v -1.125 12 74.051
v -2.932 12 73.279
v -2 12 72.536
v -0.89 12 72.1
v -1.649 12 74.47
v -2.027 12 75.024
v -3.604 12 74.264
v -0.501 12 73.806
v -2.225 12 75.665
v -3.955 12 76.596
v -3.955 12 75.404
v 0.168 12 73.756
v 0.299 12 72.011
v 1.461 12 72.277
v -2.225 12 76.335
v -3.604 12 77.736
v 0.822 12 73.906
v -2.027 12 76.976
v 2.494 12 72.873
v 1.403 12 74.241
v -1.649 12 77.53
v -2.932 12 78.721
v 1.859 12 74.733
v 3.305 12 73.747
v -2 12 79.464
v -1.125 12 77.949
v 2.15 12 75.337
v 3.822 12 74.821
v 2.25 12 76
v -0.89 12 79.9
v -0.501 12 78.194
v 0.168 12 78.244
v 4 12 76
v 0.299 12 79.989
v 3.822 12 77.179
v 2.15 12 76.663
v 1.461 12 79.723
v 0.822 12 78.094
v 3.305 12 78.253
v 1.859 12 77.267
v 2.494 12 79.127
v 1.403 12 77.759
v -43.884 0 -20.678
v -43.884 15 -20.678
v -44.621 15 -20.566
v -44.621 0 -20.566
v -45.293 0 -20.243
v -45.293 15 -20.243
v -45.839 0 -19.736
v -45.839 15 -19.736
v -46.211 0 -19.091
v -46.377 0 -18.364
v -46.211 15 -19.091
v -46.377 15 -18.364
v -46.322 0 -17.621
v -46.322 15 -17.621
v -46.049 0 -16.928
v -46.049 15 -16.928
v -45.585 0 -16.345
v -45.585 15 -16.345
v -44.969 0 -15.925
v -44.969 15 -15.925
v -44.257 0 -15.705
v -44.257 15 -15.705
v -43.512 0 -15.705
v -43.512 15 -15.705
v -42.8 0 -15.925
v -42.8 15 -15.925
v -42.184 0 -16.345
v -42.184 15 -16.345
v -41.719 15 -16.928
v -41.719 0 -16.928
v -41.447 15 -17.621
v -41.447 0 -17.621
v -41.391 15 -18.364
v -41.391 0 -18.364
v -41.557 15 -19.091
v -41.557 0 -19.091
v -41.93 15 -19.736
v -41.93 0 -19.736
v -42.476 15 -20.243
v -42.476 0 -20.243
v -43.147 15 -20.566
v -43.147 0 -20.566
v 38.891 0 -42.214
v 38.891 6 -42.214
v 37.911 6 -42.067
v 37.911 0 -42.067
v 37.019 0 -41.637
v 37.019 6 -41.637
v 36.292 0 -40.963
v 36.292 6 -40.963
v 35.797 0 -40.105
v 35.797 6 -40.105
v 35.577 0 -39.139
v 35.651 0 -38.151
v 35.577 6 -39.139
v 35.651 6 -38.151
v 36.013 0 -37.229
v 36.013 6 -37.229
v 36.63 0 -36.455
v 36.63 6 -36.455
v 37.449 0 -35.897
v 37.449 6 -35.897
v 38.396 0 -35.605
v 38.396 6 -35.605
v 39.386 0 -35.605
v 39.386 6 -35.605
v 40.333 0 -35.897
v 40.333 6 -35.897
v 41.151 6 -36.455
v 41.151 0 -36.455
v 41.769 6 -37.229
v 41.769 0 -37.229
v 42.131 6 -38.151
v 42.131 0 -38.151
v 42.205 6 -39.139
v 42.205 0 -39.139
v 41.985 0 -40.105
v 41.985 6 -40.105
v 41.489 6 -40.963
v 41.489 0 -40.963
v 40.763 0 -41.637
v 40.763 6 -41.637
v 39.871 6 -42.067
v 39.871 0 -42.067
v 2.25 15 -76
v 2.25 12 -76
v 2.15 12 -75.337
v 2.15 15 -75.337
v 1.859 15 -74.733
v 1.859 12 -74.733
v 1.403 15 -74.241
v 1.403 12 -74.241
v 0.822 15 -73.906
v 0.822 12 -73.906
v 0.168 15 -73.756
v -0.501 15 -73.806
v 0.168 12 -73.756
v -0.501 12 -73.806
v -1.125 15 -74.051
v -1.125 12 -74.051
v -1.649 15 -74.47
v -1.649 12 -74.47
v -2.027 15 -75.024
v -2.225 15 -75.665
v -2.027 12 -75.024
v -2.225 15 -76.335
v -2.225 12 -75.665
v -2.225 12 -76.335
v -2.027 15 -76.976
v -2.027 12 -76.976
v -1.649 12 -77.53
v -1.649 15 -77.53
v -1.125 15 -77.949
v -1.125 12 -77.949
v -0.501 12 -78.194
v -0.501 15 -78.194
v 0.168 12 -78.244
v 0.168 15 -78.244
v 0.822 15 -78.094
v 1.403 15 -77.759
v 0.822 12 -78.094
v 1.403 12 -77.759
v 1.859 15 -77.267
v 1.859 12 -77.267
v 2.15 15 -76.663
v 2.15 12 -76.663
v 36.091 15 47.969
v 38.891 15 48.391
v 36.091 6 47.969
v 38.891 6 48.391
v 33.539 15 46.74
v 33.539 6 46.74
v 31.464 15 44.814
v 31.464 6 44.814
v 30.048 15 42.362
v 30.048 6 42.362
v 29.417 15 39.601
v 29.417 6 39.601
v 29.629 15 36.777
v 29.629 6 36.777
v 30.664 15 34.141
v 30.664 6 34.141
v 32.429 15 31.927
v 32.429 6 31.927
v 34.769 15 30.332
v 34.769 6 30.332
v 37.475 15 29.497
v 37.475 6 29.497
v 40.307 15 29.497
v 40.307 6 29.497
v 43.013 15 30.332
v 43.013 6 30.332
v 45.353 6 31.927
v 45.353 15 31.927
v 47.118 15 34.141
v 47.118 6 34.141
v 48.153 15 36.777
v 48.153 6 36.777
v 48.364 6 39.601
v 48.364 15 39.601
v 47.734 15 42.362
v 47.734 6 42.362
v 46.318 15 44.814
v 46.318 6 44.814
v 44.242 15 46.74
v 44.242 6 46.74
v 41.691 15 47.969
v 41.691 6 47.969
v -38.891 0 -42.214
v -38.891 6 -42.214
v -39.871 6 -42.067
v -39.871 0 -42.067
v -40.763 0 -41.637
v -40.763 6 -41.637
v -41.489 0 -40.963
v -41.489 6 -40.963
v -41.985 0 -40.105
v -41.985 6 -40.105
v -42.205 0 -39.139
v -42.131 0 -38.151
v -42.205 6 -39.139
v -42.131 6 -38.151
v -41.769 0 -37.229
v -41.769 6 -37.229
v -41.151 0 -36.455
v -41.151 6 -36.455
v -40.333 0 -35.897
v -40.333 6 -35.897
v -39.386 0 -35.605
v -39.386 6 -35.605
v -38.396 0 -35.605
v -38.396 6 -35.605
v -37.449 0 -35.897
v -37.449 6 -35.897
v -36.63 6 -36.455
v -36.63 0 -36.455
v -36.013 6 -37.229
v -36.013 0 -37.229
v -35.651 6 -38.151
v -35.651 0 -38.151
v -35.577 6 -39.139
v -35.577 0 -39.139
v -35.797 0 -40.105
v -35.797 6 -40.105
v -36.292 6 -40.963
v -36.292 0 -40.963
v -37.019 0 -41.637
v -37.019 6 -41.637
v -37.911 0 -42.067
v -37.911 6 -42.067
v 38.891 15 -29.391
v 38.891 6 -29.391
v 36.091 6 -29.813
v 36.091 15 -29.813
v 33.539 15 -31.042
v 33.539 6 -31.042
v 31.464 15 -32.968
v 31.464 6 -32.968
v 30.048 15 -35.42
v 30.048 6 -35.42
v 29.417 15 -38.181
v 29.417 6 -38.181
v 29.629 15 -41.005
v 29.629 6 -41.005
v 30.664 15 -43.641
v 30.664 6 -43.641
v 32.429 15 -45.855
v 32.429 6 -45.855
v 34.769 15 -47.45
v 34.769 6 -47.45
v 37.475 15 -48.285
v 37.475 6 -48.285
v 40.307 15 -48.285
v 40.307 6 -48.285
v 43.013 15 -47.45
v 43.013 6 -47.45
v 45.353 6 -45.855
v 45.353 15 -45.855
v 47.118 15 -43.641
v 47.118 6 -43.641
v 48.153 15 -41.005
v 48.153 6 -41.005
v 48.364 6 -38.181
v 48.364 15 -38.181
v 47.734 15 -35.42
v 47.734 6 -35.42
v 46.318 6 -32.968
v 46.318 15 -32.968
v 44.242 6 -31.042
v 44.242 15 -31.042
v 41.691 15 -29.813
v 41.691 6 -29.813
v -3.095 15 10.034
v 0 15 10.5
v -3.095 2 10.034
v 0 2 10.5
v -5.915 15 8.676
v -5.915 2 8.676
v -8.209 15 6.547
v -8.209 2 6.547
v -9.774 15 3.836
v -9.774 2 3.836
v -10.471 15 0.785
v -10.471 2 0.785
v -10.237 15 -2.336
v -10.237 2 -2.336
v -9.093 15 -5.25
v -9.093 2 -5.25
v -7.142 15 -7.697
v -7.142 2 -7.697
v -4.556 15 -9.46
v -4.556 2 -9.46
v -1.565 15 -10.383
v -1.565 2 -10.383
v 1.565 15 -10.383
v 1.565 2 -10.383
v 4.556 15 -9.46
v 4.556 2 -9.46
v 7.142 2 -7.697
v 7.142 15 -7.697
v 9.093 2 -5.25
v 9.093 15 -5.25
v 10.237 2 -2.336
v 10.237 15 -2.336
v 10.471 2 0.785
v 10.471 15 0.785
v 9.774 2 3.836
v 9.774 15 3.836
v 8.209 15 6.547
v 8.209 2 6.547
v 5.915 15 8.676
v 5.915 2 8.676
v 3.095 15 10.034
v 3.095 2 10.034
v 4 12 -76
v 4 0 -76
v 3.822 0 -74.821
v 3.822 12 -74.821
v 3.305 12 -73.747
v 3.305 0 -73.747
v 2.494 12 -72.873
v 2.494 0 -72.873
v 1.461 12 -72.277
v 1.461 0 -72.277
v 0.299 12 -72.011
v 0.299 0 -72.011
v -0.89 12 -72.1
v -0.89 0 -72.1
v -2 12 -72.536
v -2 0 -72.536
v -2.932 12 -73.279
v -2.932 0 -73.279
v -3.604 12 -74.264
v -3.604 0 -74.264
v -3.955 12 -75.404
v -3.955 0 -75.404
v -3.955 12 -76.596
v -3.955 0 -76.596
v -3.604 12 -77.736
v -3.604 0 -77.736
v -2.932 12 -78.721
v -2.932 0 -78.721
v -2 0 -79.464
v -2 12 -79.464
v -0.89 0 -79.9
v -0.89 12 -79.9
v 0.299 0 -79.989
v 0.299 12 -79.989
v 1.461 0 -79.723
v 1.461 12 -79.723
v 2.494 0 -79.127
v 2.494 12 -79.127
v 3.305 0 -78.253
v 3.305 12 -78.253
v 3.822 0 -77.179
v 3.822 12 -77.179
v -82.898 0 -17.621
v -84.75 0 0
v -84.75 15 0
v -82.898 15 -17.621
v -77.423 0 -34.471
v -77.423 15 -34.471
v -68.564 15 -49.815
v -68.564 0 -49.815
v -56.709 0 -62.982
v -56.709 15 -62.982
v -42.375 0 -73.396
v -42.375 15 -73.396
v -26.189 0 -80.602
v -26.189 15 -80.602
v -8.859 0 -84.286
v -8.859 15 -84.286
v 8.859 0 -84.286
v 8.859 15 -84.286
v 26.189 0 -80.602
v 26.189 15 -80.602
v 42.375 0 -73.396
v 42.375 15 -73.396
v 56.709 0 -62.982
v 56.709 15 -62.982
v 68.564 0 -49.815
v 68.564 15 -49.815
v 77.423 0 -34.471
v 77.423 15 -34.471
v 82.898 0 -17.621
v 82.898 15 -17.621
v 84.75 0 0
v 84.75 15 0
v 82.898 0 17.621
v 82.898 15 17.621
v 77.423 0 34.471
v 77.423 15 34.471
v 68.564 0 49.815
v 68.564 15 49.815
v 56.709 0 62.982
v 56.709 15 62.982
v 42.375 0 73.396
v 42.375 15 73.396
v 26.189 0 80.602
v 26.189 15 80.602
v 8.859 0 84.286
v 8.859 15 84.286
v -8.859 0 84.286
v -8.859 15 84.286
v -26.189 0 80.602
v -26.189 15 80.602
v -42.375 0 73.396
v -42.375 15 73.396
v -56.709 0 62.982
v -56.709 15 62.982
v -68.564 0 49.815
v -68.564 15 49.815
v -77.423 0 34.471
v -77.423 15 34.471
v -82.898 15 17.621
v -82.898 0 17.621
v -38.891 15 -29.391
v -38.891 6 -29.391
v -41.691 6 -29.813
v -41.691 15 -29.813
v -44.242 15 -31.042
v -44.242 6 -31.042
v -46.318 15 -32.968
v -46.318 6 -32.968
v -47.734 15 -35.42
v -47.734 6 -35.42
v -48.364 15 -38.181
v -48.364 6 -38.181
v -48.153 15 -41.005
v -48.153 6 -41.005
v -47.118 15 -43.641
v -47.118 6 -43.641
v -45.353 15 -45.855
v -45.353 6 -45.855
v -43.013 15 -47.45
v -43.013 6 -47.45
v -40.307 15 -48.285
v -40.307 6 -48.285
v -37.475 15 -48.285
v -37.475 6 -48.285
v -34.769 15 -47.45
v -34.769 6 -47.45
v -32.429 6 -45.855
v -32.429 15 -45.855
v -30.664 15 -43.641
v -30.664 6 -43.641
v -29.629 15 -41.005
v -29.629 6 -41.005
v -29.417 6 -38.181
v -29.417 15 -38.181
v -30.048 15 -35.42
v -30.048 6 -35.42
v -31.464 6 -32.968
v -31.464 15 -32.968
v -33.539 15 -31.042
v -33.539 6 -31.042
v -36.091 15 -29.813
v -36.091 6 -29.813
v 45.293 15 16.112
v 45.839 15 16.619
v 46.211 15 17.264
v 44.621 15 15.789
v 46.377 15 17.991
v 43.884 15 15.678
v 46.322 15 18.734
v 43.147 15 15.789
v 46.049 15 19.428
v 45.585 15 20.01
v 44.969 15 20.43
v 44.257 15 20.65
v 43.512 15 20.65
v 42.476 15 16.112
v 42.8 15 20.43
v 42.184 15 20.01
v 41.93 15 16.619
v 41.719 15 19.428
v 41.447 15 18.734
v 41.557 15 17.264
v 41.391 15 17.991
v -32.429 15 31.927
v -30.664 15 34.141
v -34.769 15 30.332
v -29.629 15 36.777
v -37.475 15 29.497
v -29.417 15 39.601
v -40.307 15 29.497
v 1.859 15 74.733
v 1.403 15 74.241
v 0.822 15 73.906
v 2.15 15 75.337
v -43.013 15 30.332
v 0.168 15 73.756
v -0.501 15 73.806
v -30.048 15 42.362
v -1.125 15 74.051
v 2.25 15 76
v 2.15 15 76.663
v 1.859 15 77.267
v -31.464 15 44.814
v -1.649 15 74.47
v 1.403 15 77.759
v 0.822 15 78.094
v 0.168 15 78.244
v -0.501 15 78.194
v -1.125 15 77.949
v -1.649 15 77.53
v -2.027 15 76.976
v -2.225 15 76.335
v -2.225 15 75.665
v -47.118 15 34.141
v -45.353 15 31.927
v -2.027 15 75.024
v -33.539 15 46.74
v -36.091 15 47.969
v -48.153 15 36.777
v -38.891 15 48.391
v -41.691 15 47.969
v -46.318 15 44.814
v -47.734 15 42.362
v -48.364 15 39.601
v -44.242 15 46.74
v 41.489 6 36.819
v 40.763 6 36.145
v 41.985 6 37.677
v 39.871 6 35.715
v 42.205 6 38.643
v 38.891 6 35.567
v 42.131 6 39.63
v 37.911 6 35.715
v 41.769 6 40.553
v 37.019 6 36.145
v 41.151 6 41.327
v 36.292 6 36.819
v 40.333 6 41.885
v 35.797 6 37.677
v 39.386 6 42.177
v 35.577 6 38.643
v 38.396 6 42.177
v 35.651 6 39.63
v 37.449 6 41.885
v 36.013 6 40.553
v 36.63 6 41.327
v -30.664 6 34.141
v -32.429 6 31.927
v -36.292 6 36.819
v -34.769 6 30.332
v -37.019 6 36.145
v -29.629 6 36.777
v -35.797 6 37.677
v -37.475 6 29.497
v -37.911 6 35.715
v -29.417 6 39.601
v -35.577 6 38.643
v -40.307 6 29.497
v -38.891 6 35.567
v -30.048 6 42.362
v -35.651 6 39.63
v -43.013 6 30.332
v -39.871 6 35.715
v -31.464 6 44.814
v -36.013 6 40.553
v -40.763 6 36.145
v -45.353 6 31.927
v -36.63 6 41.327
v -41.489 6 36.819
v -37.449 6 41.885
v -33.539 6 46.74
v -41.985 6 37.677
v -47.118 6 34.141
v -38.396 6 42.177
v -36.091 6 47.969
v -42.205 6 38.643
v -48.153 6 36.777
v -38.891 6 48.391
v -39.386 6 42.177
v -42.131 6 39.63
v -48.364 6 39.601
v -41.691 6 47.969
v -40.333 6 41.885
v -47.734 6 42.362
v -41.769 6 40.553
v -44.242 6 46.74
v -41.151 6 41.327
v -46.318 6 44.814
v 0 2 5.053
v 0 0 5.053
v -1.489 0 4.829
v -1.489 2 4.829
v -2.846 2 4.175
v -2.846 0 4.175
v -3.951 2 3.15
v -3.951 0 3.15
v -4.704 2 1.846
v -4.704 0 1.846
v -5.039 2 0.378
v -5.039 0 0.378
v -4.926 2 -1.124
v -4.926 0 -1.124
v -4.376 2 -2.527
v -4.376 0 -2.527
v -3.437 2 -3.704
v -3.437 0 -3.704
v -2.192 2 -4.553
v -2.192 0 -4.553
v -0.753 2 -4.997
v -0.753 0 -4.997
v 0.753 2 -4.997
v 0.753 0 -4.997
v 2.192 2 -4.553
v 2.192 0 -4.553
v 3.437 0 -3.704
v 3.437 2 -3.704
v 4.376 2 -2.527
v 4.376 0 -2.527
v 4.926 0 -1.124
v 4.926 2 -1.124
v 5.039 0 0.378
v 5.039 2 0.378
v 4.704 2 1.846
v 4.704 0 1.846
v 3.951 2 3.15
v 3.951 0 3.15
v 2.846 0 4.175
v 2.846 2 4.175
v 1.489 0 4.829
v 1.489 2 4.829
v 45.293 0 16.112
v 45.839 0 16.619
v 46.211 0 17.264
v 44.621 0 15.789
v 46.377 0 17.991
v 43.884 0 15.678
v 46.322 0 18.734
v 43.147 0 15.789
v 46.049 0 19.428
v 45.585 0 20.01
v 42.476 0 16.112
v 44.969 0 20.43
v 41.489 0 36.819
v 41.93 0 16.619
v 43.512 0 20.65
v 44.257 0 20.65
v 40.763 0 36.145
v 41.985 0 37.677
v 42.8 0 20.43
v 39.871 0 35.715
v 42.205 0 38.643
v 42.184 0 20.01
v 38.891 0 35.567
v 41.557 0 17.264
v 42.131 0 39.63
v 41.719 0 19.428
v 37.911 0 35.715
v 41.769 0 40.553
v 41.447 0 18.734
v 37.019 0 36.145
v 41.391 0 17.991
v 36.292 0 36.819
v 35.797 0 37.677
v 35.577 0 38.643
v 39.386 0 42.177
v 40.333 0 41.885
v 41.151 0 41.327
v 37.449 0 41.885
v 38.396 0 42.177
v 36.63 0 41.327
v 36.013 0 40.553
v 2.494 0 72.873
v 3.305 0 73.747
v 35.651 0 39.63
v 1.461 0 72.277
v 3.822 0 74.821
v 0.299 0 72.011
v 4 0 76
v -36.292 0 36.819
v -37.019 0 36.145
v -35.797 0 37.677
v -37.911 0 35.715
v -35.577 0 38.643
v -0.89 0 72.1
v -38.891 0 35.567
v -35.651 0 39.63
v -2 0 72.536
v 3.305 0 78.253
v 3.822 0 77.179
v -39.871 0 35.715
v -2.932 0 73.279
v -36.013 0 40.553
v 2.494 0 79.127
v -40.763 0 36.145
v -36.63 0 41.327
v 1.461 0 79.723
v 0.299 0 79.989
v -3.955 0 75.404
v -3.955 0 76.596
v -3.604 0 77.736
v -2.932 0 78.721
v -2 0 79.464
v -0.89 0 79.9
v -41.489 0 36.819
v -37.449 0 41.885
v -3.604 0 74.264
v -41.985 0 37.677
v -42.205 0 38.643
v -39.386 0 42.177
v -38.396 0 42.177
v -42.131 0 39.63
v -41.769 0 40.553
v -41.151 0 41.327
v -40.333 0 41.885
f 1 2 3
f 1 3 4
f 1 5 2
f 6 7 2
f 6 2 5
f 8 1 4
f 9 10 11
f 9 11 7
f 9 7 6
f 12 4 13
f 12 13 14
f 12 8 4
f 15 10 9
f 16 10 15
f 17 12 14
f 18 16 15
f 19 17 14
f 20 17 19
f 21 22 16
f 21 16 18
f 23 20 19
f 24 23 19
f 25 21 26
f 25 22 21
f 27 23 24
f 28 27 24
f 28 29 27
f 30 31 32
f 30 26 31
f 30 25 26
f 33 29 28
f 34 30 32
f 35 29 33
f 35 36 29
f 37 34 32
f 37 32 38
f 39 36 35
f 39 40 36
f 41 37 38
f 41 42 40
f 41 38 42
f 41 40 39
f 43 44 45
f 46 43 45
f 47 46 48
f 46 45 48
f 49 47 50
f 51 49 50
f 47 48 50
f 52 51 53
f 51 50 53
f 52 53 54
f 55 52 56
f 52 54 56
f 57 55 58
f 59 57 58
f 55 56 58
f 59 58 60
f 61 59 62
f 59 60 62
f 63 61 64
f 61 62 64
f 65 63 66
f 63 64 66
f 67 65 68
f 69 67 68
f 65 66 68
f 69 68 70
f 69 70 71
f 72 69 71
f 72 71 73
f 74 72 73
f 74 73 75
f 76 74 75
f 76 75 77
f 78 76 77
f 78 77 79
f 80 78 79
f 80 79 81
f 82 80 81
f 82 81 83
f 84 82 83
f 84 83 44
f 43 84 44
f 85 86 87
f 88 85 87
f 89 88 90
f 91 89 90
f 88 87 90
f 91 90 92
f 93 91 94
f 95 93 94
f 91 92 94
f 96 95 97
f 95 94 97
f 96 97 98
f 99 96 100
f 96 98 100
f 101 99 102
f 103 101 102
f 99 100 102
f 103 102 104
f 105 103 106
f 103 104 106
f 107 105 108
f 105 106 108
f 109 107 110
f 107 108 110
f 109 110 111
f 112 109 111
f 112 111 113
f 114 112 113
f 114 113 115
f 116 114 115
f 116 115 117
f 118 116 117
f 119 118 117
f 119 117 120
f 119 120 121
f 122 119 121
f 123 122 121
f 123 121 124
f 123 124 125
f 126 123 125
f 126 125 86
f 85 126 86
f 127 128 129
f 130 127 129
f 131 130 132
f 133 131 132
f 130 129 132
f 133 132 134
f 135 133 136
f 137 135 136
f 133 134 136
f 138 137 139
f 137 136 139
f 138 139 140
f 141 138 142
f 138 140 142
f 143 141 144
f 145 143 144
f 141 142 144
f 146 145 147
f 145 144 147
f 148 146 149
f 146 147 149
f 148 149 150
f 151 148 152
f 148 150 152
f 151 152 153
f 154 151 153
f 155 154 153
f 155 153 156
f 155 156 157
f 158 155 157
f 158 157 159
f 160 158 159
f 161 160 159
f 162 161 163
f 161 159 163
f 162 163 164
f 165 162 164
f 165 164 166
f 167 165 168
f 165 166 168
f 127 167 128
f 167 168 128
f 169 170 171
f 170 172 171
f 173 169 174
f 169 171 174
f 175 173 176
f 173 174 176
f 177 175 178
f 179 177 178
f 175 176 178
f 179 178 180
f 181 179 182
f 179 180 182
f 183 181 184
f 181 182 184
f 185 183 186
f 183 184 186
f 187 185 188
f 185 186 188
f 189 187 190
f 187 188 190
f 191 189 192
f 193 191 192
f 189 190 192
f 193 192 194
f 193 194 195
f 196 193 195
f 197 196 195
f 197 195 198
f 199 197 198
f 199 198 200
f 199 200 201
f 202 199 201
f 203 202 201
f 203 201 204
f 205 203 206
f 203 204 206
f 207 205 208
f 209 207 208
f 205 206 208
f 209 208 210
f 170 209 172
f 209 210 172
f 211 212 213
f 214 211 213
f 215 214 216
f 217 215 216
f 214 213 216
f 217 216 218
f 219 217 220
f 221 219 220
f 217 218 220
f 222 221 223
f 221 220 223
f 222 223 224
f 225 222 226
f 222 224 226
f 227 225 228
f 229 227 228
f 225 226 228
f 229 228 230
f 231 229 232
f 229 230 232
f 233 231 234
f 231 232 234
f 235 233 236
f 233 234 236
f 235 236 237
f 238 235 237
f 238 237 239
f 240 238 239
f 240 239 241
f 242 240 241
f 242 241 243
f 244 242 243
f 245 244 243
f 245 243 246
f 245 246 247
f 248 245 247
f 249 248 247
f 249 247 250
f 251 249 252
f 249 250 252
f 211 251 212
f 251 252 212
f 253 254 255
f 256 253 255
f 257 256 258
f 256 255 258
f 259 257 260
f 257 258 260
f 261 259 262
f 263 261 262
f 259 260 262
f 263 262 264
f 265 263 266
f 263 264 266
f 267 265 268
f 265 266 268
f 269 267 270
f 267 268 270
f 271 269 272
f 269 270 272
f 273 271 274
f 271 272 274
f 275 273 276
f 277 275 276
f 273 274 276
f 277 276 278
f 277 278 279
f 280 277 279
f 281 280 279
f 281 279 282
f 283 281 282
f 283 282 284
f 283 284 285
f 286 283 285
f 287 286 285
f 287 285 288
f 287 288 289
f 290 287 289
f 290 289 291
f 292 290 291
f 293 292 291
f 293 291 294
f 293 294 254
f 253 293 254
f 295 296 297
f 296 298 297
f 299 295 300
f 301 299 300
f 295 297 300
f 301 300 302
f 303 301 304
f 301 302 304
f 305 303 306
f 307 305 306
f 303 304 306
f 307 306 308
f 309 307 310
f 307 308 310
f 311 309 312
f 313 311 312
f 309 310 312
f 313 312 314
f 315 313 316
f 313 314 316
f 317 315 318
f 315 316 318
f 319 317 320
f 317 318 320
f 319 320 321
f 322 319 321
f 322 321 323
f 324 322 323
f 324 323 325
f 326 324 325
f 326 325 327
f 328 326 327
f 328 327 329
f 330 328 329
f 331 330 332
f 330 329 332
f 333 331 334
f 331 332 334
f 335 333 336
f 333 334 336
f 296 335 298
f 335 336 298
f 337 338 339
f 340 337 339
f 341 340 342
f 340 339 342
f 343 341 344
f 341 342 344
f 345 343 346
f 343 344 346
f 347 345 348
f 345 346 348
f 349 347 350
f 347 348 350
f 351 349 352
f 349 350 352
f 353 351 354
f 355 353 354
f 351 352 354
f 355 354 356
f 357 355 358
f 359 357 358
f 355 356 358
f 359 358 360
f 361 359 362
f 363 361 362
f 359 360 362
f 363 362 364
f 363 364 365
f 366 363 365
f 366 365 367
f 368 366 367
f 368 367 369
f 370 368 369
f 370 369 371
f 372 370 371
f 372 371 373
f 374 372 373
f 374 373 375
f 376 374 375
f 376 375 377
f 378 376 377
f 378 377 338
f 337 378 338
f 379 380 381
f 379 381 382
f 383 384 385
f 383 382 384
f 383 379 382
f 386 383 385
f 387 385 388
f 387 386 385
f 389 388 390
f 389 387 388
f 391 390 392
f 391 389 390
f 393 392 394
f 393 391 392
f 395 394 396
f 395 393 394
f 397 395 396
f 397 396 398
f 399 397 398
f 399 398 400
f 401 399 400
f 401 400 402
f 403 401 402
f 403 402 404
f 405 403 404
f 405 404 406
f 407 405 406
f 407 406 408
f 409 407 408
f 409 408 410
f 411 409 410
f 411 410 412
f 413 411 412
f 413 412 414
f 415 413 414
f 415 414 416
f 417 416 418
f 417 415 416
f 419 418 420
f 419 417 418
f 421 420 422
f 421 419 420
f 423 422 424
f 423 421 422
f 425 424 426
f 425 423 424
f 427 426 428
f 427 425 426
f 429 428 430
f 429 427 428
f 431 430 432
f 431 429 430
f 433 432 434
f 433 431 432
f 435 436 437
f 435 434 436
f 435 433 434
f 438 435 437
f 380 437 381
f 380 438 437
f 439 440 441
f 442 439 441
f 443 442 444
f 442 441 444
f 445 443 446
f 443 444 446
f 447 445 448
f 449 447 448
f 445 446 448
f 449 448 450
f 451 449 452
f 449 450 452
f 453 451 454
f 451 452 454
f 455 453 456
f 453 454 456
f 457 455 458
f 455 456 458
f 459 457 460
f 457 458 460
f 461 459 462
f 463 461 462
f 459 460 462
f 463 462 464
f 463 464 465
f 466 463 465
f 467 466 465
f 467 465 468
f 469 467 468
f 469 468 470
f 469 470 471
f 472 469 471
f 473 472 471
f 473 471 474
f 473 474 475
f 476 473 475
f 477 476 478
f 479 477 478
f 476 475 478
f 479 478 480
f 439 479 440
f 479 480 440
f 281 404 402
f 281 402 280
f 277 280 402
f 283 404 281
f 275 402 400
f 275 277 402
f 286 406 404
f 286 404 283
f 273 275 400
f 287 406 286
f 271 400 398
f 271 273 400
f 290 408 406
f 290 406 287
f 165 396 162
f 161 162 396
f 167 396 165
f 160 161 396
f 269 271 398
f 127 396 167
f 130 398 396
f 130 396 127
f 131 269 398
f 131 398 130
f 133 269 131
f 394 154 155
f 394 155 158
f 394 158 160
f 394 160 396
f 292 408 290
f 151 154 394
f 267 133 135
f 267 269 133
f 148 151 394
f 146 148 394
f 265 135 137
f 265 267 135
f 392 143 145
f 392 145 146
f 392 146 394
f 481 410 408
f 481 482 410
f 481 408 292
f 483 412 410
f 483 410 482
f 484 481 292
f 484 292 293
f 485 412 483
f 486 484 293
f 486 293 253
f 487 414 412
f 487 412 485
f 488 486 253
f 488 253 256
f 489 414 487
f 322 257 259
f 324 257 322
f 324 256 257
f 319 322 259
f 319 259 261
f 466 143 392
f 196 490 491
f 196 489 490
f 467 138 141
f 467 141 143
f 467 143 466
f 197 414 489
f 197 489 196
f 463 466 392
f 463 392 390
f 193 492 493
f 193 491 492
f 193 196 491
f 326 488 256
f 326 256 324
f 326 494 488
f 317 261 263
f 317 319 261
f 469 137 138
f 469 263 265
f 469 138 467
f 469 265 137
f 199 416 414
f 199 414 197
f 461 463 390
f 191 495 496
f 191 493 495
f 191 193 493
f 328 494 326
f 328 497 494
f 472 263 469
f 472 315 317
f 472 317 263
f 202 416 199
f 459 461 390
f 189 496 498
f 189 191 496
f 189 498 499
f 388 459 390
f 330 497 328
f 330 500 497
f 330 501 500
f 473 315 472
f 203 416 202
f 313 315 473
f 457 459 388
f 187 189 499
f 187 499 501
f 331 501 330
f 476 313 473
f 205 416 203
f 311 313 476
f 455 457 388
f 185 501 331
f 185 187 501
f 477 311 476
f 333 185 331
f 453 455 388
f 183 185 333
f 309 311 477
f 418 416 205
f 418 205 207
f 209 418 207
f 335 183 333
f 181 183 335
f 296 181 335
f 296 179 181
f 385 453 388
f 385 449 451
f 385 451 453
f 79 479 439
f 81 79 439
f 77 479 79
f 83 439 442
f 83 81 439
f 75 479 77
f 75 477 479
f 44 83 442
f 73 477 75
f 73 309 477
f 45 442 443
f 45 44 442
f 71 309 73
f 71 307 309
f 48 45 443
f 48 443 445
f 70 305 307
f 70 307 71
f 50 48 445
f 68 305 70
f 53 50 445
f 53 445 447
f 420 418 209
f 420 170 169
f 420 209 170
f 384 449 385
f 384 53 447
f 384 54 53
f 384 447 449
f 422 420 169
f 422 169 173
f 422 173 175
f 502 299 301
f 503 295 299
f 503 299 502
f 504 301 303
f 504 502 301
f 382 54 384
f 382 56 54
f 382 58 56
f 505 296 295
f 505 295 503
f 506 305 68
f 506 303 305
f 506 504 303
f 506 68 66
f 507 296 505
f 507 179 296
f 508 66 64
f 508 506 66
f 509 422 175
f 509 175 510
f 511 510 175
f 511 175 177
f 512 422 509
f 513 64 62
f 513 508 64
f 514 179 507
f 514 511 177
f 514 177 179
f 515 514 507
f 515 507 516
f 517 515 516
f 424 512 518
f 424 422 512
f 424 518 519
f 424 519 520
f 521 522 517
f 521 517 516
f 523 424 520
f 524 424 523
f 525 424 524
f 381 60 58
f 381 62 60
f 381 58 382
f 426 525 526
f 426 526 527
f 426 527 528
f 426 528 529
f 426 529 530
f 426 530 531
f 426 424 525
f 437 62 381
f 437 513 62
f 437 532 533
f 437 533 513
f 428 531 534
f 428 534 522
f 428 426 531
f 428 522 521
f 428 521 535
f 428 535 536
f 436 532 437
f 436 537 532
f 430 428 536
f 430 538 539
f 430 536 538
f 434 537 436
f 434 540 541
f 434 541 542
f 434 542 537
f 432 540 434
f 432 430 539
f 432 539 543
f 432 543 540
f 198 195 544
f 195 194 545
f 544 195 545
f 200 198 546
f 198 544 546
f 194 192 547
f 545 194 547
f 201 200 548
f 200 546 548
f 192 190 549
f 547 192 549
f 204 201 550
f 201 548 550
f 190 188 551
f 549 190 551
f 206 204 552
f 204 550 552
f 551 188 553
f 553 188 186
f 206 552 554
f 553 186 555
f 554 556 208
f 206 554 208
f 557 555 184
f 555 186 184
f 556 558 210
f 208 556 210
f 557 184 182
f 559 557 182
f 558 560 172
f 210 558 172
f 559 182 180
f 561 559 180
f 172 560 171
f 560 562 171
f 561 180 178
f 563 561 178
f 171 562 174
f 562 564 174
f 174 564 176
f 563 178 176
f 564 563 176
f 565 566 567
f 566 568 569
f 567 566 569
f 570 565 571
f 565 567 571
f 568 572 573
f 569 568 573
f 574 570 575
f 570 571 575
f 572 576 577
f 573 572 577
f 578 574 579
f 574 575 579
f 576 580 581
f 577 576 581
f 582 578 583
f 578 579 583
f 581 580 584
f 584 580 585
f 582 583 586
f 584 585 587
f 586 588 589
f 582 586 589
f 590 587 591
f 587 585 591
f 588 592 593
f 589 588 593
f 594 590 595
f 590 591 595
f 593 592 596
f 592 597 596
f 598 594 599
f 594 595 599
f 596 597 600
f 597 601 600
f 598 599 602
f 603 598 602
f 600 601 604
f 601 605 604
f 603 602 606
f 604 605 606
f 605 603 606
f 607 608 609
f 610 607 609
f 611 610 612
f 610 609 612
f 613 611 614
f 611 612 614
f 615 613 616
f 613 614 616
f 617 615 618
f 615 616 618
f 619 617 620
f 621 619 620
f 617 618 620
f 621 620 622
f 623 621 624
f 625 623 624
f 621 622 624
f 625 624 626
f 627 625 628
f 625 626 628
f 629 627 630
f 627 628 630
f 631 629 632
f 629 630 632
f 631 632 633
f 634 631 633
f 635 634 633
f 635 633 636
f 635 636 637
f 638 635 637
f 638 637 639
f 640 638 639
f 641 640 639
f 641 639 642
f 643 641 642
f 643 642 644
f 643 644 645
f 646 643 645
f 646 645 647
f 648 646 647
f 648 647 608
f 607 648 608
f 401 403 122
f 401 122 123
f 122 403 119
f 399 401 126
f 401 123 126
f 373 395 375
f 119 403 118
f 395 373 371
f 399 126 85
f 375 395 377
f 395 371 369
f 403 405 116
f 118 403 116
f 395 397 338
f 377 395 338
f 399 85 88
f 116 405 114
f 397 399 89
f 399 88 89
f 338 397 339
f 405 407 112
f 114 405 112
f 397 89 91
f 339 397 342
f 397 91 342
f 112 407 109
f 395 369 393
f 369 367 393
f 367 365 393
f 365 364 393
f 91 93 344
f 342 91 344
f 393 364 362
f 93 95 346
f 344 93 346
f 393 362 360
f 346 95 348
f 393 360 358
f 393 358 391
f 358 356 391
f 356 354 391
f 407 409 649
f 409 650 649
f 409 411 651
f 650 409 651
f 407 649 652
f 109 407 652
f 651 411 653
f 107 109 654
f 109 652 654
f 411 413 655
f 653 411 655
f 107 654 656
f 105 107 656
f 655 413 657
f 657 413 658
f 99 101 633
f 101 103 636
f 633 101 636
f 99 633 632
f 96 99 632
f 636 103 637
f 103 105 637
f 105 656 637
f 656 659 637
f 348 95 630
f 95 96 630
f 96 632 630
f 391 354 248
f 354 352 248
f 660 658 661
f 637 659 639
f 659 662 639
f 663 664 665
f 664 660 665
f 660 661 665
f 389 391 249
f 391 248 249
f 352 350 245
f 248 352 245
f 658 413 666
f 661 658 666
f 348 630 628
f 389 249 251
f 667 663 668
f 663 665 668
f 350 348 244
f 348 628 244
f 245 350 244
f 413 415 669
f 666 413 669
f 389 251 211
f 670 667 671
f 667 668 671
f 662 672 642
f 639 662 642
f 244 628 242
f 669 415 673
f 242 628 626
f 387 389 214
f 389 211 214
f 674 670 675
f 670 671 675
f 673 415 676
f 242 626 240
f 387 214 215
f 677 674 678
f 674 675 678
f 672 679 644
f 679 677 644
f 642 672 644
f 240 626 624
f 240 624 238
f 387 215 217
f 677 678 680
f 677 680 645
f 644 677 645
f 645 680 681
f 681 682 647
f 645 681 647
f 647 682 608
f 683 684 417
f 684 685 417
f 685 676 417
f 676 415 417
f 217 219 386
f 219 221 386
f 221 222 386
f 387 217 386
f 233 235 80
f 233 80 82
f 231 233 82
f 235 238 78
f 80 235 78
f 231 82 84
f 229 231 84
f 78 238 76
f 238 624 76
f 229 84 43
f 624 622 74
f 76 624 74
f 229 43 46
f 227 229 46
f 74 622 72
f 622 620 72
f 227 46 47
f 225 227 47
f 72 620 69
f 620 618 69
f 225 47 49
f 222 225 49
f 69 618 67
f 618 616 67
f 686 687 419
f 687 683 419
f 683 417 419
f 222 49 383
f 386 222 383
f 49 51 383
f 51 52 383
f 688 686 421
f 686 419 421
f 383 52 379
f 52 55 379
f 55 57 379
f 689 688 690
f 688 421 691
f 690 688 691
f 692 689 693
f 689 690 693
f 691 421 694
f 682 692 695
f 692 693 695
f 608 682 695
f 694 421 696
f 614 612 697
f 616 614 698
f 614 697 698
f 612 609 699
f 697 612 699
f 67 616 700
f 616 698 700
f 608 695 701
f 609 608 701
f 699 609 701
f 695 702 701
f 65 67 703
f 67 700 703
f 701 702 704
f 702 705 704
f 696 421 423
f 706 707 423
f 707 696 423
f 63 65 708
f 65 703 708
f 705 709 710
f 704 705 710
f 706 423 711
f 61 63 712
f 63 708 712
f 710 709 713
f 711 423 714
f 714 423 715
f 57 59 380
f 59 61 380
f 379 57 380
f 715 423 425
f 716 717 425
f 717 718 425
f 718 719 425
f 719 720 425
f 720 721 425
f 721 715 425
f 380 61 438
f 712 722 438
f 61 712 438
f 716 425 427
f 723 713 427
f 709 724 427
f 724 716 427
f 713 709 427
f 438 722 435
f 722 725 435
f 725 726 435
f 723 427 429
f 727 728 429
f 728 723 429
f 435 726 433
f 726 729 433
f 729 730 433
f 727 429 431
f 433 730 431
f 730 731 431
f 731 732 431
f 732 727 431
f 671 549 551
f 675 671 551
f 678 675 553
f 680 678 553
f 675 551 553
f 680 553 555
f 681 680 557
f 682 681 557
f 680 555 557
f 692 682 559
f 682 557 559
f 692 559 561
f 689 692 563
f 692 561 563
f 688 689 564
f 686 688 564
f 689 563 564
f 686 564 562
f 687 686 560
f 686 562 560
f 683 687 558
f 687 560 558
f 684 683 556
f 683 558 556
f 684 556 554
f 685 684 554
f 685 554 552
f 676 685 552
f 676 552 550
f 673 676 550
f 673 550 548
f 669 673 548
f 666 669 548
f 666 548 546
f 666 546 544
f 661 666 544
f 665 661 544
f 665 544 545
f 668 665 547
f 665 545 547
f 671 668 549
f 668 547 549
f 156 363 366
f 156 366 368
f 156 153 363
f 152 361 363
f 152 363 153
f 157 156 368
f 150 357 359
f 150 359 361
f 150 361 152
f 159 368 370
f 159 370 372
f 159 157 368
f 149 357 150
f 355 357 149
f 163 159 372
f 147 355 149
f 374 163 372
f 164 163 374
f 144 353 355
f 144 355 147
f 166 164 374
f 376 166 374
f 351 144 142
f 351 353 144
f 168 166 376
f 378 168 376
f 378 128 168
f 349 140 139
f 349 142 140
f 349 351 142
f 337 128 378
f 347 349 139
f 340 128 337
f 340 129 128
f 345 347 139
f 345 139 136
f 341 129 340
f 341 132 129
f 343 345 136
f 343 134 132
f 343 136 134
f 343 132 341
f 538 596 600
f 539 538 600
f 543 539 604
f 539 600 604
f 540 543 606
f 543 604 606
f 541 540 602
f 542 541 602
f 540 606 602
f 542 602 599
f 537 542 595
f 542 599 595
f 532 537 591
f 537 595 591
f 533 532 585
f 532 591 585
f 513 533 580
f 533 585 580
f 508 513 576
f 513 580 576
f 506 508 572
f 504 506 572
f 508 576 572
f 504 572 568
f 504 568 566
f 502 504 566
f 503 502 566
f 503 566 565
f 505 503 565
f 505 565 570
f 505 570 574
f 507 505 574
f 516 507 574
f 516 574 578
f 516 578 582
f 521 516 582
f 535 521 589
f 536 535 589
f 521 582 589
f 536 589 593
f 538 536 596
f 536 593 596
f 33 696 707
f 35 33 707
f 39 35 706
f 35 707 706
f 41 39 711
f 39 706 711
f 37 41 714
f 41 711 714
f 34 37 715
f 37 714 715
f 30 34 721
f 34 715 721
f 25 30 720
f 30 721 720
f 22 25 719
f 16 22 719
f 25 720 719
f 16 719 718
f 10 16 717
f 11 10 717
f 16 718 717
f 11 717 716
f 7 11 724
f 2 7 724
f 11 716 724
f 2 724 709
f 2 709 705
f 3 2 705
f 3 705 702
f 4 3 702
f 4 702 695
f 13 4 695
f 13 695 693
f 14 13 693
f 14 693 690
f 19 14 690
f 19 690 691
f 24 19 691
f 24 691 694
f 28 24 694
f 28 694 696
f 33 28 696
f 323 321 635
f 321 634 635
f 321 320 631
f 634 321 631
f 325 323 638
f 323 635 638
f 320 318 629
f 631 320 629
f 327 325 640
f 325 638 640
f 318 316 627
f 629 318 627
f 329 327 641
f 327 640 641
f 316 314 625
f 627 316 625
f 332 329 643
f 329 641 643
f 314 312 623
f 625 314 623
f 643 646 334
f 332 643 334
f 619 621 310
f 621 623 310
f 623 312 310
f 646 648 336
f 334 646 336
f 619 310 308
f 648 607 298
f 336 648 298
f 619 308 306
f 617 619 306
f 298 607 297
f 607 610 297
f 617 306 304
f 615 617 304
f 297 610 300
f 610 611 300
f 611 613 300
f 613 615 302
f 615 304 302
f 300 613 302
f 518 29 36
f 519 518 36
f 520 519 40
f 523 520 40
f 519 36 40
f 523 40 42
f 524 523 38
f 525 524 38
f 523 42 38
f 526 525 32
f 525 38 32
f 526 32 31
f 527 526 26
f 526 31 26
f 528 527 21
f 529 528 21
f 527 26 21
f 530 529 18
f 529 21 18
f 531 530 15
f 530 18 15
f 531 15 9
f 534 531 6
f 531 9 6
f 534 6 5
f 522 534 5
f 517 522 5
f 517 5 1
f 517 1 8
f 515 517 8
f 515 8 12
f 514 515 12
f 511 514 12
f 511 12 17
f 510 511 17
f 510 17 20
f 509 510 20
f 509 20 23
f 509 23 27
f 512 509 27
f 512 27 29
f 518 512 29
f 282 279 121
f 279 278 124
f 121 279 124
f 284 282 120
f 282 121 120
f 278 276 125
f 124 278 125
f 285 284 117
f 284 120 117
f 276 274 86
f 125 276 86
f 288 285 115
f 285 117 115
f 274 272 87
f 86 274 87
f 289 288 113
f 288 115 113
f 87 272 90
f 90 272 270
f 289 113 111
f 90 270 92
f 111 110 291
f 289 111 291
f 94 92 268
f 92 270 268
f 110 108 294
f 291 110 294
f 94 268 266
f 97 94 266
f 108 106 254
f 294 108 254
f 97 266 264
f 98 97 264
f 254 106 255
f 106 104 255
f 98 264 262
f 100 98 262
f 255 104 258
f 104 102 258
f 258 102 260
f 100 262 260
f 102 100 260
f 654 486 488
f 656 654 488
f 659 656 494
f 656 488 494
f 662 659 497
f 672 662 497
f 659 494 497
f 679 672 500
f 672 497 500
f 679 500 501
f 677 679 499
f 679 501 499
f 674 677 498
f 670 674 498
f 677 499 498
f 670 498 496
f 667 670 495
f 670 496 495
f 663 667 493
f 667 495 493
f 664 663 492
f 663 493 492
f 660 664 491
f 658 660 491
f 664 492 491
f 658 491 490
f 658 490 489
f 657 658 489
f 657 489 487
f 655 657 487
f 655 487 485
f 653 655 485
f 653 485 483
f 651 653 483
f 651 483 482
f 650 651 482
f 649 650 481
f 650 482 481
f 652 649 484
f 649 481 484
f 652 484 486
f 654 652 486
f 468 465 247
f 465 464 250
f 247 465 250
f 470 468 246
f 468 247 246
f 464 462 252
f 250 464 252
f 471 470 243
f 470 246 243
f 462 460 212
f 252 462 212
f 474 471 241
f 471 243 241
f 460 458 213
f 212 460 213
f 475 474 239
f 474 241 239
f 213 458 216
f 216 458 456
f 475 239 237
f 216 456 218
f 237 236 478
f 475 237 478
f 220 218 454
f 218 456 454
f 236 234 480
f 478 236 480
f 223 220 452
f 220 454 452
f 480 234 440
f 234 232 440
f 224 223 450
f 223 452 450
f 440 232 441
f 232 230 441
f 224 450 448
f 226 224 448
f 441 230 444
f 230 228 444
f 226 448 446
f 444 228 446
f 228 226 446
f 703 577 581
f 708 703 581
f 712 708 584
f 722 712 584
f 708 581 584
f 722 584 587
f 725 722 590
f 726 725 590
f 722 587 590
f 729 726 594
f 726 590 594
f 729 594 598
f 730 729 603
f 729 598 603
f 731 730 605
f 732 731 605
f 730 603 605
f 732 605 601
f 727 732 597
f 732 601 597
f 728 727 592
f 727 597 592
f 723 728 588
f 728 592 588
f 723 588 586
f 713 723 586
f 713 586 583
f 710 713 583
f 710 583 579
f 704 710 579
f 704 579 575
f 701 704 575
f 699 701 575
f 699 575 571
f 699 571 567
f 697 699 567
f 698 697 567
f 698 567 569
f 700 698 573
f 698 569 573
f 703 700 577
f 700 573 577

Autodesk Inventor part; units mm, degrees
ref_plane "YZ Plane" through (0, 0, 0) normal (1, 0, 0) x (0, 1, 0)
ref_plane "XZ Plane" through (0, 0, 0) normal (0, 1, 0) x (-1, 0, 0)
ref_plane "XY Plane" through (0, 0, 0) normal (0, 0, 1) x (1, 0, 0)
sketch "Sketch1" plane through (0, 0, 0) normal (0, 1, 0) x (-1, 0, 0)
  circle A0 centre (0, 0) radius 84.75
  dimension "d0" = 169.5
extrude "Extrusion1" add sketch "Sketch1" along normal blind 15
sketch "Sketch2" plane through (0, 0, 0) normal (0, -1, 0) x (1, 0, 0)
  circle A0 centre (0, 0) radius 76
  circle A1 centre (0, 76) radius 4
  circle A2 centre (0, -76) radius 4
  circle A3 centre (0, 76) radius 2.25
  circle A4 centre (0, -76) radius 2.25
  dimension "d3" = 152
  dimension "d4" = 8
  dimension "d5" = 8
  dimension "d6" = 4.5
  dimension "d7" = 4.5
extrude "Extrusion2" cut sketch "Sketch2" against normal through all contours A3 A0 | A0 A3 | A4 A0 | A0 A4
extrude "Extrusion3" cut sketch "Sketch2" against normal blind 12 contours A1 A0 A3 | A0 A3 A1 | A2 A0 A4 | A0 A4 A2 | A3 A0 | A0 A3 | A4 A0 | A0 A4
sketch "Sketch3" plane through (0, 0, 0) normal (0, -1, 0) x (1, 0, 0)
  circle A0 centre (0, 0) radius 84.75
  circle A1 centre (0, 0) radius 20
  circle A2 centre (0, -20) radius 4
  circle A3 centre (20, 0) radius 4
  circle A4 centre (0, 20) radius 4
  circle A5 centre (-20, 0) radius 4
  line L0 (55, 55) -> (-55, 55)
  line L1 (-55, 55) -> (-55, -55)
  line L2 (-55, -55) -> (55, -55)
  line L3 (55, -55) -> (55, 55)
  line L4 (55, 55) -> (-55, -55) construction
  line L5 (-55, 55) -> (55, -55) construction
  circle A6 centre (0, 0) radius 55
  circle A7 centre (-38.8909, -38.8909) radius 4
  circle A8 centre (38.8909, -38.8909) radius 4
  circle A9 centre (38.8909, 38.8909) radius 4
  circle A10 centre (-38.8909, 38.8909) radius 4
  dimension "d12" = 40
  dimension "d13" = 8
  dimension "d16" = 360
  dimension "d21" = 110
  dimension "d22" = 110
  dimension "d23" = 110
  dimension "d24" = 8
  dimension "d25" = 8
  dimension "d26" = 8
  dimension "d27" = 8
hole "Hole1" at (38.8909, 0, -38.8909) at (38.8909, 0, 38.8909) at (-38.8909, 0, 38.8909) at (-38.8909, 0, -38.8909) direction (0, 1, 0) diameter 6.647 depth 20 tip angle 118 thread size "M8x1.25" class "6H" standard "ANSI Metric M Profile"
sketch "Sketch4" plane through (0, 0, 0) normal (0, -1, 0) x (1, 0, 0)
  circle A0 centre (0, 0) radius 47.5
  circle A1 centre (-47.5, 0) radius 2.5
  circle A2 centre (-43.8843, -18.1775) radius 2.5
  circle A3 centre (-33.5876, -33.5876) radius 2.5
  circle A4 centre (-18.1775, -43.8843) radius 2.5
  circle A5 centre (0, -47.5) radius 2.5
  circle A6 centre (18.1775, -43.8843) radius 2.5
  circle A7 centre (33.5876, -33.5876) radius 2.5
  circle A8 centre (43.8843, -18.1775) radius 2.5
  circle A9 centre (47.5, 0) radius 2.5
  circle A10 centre (43.8843, 18.1775) radius 2.5
  circle A11 centre (33.5876, 33.5876) radius 2.5
  circle A12 centre (18.1775, 43.8843) radius 2.5
  circle A13 centre (0, 47.5) radius 2.5
  circle A14 centre (-18.1775, 43.8843) radius 2.5
  circle A15 centre (-33.5876, 33.5876) radius 2.5
  circle A16 centre (-43.8843, 18.1775) radius 2.5
  dimension "d35" = 95
  dimension "d36" = 5
  dimension "d39" = 360
hole "Hole2" at (43.8843, 0, 18.1775) at (-43.8843, 0, -18.1775) direction (0, 1, 0) diameter 5 end through all
sketch "Sketch5" plane through (0, 15, 0) normal (0, 1, 0) x (1, 0, 0)
  circle A0 centre (0, 0) radius 84.75
hole "Hole3" at (0, 15, 0) direction (0, -1, 0) diameter 10.106 depth 32.3 tip angle 118 counterbore diameter 21 counterbore depth 13 thread size "M12x1.75" class "6H" standard "ANSI Metric M Profile"
sketch "Sketch6" plane through (0, 15, 0) normal (0, 1, 0) x (1, 0, 0)
  circle A0 centre (-38.8909, -38.8909) radius 3.3235 projected
  circle A1 centre (-38.8909, -38.8909) radius 3.3235
  circle A2 centre (-38.8909, 38.8909) radius 3.3235 projected
  circle A3 centre (-38.8909, 38.8909) radius 3.3235
  circle A4 centre (38.8909, 38.8909) radius 3.3235 projected
  circle A5 centre (38.8909, 38.8909) radius 3.3235
  circle A6 centre (38.8909, -38.8909) radius 3.3235 projected
  circle A7 centre (38.8909, -38.8909) radius 3.3235
  point P0 (0, 0)
hole "Hole4" at (-38.8909, 15, 38.8909) at (-38.8909, 15, -38.8909) at (38.8909, 15, 38.8909) at (38.8909, 15, -38.8909) direction (0, -1, 0) diameter 6.647 depth 20 tip angle 118 counterbore diameter 19 counterbore depth 9 thread size "M8x1.25" class "6H" standard "ANSI Metric M Profile"
properties part number "substrate plate"
